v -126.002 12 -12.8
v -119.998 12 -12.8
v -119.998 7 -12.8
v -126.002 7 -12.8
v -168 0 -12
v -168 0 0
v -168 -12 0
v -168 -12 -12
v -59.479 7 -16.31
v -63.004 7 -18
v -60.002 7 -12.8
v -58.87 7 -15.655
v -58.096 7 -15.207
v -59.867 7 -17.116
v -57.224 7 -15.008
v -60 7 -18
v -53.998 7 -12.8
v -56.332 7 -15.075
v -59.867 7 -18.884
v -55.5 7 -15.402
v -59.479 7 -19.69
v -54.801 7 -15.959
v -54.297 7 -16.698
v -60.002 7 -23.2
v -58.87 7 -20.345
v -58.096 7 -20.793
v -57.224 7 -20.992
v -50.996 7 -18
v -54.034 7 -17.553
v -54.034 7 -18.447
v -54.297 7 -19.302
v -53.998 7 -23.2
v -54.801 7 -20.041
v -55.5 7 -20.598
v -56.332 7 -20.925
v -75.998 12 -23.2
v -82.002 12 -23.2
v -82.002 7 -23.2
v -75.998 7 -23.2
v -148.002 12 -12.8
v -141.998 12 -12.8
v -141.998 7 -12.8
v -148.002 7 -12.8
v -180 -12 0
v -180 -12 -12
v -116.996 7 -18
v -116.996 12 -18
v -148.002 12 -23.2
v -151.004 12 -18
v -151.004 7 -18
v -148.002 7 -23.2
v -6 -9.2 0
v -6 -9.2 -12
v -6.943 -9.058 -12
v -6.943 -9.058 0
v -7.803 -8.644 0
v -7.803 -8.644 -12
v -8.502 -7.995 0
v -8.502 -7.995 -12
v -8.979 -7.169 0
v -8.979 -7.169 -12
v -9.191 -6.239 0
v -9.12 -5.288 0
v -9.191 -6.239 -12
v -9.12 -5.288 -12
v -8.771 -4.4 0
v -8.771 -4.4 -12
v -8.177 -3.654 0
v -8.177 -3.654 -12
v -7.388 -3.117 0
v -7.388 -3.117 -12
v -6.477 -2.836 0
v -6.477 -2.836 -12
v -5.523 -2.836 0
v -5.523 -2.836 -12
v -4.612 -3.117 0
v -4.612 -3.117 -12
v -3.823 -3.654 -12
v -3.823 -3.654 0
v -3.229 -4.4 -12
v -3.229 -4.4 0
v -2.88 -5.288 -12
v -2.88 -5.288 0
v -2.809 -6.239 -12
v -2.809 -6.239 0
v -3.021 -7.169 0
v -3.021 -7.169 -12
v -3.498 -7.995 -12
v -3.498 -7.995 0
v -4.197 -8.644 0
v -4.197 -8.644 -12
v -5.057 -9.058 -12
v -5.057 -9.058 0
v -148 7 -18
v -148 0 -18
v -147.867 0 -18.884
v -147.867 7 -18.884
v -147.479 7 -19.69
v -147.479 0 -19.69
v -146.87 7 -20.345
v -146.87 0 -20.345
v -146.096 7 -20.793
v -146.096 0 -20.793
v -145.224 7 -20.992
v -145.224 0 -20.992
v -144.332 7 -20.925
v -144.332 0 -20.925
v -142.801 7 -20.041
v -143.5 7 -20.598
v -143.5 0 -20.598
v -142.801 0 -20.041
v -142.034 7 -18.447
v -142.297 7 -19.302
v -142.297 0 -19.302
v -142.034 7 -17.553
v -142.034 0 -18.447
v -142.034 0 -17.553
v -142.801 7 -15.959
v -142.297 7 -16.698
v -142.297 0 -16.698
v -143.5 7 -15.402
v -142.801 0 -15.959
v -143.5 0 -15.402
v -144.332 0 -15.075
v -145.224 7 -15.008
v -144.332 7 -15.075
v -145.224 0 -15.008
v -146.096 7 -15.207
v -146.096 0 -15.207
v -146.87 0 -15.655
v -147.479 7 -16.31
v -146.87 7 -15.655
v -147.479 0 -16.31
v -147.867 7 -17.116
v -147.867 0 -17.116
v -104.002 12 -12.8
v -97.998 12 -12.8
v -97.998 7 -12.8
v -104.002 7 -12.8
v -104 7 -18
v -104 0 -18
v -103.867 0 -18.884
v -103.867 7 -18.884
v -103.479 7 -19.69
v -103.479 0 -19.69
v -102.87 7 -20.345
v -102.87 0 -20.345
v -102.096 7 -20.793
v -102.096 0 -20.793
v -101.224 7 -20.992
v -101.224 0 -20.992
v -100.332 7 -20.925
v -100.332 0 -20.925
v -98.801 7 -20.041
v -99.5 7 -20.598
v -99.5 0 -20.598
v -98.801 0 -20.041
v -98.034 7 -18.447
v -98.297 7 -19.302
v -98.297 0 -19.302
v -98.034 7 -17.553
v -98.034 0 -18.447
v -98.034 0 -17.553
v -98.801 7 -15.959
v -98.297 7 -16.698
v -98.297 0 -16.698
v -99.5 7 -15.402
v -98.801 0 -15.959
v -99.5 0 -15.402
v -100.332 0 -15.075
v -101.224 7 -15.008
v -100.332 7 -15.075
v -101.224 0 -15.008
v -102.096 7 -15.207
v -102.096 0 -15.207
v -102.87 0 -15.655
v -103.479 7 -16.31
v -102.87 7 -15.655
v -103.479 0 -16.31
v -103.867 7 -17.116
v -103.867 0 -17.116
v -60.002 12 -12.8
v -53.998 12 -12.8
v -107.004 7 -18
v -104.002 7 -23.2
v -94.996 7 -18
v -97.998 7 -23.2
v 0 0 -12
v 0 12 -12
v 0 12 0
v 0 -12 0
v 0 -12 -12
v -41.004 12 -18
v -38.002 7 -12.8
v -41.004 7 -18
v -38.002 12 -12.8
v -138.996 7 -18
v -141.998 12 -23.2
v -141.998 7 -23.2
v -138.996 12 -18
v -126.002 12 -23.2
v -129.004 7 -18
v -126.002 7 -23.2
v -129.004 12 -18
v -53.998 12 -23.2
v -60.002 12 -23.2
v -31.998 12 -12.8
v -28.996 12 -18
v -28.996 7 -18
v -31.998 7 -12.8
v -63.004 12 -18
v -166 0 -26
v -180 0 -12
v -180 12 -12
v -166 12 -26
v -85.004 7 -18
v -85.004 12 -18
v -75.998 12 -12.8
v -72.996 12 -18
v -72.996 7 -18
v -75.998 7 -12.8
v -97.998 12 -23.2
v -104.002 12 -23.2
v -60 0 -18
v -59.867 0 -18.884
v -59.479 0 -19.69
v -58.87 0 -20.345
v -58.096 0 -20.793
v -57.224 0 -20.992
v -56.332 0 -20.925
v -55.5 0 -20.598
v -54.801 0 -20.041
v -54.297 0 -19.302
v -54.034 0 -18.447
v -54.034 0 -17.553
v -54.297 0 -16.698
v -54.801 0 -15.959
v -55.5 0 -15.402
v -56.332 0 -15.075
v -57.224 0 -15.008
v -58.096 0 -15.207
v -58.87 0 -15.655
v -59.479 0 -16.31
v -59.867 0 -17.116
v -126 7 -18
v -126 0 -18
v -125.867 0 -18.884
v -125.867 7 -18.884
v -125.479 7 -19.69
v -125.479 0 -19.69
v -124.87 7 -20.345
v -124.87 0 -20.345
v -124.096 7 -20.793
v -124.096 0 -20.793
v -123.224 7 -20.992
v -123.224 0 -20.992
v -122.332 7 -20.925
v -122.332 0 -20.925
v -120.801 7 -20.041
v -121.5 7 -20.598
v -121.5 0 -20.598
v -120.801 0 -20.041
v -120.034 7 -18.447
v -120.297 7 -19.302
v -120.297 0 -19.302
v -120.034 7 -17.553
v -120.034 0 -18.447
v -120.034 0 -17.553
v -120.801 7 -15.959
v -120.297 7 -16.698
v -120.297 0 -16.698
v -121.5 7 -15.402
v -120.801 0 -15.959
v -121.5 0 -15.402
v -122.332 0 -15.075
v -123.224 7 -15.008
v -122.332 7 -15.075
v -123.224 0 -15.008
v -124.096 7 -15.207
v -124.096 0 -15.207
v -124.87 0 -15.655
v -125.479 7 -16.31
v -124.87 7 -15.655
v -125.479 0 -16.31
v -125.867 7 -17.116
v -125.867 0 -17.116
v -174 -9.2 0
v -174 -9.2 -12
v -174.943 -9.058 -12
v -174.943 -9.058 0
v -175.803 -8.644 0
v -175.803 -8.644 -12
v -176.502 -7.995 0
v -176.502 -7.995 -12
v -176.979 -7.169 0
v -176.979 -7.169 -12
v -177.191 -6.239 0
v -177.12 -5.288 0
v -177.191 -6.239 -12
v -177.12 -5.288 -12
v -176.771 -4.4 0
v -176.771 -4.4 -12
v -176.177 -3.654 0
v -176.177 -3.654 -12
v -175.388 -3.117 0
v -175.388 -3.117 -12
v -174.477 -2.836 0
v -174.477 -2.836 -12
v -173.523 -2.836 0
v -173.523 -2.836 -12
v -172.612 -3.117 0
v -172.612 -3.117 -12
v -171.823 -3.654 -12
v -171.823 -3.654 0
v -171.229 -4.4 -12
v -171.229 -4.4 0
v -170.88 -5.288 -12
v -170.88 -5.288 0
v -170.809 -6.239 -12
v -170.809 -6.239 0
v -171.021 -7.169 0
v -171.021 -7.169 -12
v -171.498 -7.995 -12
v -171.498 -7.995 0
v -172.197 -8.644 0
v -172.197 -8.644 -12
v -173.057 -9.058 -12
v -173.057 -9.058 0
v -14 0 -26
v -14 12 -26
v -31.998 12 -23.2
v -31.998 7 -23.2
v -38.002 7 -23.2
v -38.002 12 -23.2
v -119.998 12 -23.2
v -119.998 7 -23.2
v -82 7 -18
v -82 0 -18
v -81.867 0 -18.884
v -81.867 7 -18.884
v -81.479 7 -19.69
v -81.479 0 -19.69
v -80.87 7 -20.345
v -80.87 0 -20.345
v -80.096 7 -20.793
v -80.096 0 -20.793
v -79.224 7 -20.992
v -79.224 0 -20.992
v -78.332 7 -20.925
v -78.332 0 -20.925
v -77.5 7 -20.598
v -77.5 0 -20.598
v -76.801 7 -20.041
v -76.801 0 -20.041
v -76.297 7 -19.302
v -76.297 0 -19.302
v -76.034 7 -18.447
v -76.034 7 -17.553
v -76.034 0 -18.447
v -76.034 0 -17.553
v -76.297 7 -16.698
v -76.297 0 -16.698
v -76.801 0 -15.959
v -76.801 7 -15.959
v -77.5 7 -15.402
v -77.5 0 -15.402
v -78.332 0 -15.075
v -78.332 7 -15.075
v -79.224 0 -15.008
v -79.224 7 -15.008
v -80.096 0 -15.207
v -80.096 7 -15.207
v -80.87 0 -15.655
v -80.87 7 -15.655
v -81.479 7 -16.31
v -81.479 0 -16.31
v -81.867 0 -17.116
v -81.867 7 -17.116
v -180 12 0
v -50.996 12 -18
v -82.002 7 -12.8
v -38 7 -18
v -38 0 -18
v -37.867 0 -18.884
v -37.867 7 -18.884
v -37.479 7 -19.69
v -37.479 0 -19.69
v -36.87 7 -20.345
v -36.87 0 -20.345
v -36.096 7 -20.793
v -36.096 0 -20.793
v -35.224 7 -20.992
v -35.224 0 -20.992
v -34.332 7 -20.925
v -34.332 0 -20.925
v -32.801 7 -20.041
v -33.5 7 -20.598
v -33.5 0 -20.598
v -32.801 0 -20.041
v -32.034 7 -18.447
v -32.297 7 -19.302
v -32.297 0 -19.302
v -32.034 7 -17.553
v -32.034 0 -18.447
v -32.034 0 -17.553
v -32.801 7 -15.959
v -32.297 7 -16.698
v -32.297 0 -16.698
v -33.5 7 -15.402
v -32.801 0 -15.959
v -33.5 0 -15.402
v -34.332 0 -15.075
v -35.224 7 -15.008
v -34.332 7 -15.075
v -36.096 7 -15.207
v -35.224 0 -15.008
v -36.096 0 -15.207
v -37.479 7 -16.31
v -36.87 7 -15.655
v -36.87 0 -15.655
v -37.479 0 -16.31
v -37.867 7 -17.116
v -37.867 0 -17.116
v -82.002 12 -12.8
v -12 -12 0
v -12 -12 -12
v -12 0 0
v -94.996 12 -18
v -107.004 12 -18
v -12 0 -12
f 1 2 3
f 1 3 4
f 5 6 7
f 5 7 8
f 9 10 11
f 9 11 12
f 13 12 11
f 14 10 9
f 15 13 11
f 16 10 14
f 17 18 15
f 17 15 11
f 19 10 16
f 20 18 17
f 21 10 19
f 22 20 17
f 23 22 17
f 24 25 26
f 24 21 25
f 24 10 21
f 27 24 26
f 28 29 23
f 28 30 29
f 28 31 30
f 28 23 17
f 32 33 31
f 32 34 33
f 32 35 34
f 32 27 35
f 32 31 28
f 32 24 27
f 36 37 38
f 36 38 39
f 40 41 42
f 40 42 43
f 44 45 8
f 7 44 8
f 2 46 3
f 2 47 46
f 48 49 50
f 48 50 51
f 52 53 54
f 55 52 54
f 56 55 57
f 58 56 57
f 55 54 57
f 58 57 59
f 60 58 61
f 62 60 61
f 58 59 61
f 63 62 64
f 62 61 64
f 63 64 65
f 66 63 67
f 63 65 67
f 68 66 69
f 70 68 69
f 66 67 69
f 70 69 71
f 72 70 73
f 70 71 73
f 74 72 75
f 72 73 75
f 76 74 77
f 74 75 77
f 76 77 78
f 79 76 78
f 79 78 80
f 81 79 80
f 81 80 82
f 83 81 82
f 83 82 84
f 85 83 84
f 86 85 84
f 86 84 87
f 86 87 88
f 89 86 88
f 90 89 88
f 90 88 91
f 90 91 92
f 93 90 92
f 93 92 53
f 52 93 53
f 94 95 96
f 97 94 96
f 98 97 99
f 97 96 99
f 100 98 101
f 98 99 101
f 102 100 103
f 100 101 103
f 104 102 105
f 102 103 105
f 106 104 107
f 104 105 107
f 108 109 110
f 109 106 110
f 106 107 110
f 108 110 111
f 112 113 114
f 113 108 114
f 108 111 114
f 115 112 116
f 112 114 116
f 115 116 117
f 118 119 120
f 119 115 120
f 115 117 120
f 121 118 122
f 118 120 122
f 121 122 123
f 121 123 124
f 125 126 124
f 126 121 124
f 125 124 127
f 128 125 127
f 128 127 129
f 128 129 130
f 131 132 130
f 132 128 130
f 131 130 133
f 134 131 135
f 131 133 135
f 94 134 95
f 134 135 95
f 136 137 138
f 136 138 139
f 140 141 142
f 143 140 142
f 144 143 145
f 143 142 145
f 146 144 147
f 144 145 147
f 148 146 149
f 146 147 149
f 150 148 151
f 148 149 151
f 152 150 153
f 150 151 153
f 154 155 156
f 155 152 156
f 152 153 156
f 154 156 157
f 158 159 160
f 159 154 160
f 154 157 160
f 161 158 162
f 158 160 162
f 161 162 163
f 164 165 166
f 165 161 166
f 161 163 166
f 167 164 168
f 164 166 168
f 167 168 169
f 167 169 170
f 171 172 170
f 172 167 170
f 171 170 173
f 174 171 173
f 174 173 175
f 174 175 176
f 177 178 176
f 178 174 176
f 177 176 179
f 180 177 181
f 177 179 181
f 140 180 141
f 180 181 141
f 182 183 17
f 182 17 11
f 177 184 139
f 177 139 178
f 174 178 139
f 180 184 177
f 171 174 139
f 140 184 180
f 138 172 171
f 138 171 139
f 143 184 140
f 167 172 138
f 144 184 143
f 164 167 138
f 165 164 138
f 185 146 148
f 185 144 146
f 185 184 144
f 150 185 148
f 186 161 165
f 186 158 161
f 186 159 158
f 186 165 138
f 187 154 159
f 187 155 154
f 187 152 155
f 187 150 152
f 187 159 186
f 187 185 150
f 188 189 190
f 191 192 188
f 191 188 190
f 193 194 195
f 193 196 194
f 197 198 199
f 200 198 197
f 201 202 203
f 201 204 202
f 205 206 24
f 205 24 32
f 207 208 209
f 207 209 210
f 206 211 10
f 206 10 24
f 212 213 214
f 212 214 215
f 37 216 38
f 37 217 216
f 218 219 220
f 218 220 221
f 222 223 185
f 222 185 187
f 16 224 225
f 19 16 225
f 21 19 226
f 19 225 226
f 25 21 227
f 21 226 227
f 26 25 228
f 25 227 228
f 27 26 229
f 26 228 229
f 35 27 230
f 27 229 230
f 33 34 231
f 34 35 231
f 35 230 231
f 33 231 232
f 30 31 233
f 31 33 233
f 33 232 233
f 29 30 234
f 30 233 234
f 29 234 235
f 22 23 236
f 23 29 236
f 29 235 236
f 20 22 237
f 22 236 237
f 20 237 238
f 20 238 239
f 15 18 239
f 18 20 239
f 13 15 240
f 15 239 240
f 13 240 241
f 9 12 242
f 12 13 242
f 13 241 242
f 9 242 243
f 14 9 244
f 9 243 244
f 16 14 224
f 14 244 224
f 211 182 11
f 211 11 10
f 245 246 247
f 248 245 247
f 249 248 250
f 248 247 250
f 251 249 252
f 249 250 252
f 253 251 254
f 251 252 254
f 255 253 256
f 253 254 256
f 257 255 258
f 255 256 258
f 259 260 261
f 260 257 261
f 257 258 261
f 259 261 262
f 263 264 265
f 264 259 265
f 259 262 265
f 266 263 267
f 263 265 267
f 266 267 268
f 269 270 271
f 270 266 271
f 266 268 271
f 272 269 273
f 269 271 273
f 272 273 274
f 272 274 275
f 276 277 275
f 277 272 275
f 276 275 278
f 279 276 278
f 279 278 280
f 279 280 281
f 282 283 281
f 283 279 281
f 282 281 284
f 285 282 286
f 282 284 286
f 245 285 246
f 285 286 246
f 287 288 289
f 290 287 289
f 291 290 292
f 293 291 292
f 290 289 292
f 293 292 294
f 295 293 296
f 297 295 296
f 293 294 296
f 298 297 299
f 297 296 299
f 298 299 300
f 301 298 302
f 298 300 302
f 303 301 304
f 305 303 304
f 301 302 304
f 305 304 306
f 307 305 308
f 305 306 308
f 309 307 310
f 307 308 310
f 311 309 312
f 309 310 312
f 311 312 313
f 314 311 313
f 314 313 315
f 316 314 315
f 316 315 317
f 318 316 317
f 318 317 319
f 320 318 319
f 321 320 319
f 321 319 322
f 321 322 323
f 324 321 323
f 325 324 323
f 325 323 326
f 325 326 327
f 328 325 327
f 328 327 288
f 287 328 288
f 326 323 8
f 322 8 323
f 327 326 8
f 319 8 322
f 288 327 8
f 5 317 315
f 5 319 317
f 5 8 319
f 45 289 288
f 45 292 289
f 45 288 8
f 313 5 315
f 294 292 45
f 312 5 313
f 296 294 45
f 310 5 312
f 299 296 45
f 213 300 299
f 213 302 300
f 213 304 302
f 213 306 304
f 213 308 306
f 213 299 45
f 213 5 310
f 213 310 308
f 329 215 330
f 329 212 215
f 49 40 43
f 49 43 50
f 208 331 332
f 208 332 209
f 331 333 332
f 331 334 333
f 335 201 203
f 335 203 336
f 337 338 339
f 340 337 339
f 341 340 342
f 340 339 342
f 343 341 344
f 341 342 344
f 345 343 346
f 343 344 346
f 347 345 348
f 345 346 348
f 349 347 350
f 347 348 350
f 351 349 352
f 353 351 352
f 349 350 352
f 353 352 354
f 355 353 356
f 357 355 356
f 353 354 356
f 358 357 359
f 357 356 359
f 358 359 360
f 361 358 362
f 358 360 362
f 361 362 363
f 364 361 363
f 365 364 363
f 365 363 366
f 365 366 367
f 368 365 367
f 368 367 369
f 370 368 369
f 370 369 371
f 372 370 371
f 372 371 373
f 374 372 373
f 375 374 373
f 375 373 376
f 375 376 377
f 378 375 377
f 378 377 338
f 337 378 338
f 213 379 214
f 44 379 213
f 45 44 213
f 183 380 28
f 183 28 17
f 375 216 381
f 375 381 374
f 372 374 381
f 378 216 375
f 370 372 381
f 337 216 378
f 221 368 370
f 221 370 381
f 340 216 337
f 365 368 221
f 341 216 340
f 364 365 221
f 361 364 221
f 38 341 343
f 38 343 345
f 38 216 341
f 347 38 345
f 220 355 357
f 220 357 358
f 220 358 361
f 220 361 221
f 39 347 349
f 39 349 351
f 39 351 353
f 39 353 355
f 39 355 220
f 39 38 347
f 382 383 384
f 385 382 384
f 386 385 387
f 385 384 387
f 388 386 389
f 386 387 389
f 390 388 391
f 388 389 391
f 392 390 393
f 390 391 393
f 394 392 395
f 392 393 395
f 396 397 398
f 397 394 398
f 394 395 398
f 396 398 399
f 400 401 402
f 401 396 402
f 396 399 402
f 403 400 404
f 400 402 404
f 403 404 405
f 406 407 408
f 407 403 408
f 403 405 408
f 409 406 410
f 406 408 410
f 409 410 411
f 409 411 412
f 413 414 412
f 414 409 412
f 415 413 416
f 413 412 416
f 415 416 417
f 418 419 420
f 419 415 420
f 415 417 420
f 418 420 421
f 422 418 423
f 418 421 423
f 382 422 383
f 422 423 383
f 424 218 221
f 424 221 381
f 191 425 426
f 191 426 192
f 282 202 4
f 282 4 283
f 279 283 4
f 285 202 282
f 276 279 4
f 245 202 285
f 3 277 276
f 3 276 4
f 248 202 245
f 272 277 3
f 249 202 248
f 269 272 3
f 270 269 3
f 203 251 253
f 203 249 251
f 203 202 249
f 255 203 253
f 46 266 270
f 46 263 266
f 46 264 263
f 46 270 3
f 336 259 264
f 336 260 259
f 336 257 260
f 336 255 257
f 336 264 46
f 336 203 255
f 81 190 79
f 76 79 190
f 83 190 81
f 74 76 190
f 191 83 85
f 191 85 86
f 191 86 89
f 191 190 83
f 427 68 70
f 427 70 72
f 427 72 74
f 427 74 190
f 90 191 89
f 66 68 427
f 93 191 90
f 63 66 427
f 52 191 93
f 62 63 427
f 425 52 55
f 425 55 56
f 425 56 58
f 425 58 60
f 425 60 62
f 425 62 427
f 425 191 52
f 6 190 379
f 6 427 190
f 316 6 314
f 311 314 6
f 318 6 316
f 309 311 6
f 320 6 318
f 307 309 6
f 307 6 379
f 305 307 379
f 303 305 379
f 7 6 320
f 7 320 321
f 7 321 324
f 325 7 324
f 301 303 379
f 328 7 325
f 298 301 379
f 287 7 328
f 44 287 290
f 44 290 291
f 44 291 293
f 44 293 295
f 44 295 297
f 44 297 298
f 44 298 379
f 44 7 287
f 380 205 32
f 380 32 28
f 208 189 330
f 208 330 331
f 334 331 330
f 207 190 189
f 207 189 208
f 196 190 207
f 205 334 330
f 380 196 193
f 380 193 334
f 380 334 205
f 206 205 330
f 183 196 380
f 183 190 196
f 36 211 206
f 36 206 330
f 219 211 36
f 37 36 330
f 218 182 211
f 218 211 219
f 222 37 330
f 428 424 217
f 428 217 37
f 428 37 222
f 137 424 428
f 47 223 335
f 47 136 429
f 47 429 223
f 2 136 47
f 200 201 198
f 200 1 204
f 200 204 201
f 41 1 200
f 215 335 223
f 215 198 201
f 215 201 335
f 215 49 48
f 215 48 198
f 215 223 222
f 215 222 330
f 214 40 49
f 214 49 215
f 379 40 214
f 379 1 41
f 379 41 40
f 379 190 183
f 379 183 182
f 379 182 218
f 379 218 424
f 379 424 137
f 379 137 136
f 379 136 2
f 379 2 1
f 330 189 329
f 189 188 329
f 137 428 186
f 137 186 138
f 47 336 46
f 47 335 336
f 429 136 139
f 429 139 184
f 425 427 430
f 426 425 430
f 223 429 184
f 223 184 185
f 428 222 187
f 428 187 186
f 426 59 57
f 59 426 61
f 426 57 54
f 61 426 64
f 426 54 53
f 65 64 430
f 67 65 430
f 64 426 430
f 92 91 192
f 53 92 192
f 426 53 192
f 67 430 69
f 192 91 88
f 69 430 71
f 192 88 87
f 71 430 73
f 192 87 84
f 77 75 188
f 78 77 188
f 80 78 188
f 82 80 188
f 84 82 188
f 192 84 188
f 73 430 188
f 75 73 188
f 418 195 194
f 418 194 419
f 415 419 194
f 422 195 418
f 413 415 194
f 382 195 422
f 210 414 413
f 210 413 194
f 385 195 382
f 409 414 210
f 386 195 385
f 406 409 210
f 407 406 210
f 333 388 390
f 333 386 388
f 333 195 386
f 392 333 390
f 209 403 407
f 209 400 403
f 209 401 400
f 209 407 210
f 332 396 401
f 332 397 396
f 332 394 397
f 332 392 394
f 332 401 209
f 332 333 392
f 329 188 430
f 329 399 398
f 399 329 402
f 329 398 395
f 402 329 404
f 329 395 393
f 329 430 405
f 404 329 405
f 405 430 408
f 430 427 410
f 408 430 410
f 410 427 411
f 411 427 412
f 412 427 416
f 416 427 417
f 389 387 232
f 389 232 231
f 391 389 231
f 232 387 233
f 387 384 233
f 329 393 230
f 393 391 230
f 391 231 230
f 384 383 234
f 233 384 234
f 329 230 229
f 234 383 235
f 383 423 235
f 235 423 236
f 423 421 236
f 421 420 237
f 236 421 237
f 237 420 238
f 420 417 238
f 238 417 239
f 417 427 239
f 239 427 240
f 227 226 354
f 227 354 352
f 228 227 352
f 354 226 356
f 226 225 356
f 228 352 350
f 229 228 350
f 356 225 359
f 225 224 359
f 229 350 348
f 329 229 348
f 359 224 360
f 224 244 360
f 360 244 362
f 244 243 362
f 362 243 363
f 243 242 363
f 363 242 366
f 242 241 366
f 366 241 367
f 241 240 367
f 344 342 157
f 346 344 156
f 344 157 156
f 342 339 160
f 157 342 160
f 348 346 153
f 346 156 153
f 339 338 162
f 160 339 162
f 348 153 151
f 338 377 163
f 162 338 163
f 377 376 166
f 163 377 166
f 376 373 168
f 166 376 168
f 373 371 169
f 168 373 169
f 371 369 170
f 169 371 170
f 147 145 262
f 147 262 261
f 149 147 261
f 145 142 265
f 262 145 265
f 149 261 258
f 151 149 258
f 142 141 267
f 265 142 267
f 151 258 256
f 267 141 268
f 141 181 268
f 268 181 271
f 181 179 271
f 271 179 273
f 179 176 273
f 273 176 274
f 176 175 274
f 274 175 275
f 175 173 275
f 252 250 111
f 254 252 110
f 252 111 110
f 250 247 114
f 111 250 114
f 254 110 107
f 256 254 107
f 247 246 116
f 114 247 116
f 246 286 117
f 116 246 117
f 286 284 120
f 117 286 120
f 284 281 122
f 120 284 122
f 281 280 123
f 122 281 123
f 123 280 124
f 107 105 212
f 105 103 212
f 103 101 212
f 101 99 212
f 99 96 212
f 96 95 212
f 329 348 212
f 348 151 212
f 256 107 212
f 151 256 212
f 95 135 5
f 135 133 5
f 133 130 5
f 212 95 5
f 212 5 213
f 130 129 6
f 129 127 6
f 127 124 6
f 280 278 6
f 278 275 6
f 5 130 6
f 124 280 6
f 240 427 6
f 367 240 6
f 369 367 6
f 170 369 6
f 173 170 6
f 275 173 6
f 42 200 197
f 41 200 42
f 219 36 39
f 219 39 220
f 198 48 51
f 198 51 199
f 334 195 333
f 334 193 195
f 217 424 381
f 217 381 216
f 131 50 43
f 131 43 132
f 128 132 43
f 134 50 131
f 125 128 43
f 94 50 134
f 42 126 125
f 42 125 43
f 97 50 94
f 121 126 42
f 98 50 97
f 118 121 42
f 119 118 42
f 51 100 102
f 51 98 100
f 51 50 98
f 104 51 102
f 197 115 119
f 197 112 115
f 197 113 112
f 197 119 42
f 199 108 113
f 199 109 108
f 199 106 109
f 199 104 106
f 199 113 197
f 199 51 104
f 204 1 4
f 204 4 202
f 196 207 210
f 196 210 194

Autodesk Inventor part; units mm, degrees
ref_plane "YZ Plane" through (0, 0, 0) normal (1, 0, 0) x (0, 1, 0)
ref_plane "XZ Plane" through (0, 0, 0) normal (0, 1, 0) x (-1, 0, 0)
ref_plane "XY Plane" through (0, 0, 0) normal (0, 0, 1) x (1, 0, 0)
sketch "Sketch5" plane through (0, 0, 0) normal (0, 1, 0) x (-1, 0, 0)
  line L0 (0, 0) -> (180, 0)
  line L1 (180, 0) -> (180, -12)
  line L2 (0, -12) -> (0, 0)
  line L3 (166, -26) -> (14, -26)
  line L4 (0, -12) -> (14, -26)
  line L5 (180, -12) -> (166, -26)
  circle A0 centre (101, -18) radius 3
  circle A1 centre (79, -18) radius 3
  circle A2 centre (57, -18) radius 3
  circle A3 centre (123, -18) radius 3
  circle A4 centre (145, -18) radius 3
  circle A5 centre (35, -18) radius 3
  dimension "d57" = 6
  dimension "d58" = 79
  dimension "d59" = 180
  dimension "d60" = 12
  dimension "d61" = 14
  dimension "d62" = 14
  dimension "d63" = 14
  dimension "d64" = 14
  dimension "d65" = 152
  dimension "d66" = 8
  dimension "d67" = 6
  dimension "d68" = 6
  dimension "d69" = 6
  dimension "d70" = 6
  dimension "d71" = 8
  dimension "d72" = 8
  dimension "d73" = 8
  dimension "d74" = 8
  dimension "d75" = 22
  dimension "d76" = 22
  dimension "d77" = 22
  dimension "d78" = 22
  dimension "d95" = 6
  dimension "d96" = 0
  dimension "d97" = 22
extrude "Extrusion7" add sketch "Sketch5" along normal blind 12
sketch "Sketch8" plane through (0, 0, 0) normal (0, -1, 0) x (1, 0, 0)
  line L0 (0, 0) -> (0, -12) projected
  line L1 (0, 0) -> (-12, 0)
  line L2 (-12, 0) -> (-12, -12)
  line L3 (-12, -12) -> (0, -12)
  line L4 (0, -12) -> (0, 0)
  line L5 (-180, -12) -> (-180, 0) projected
  line L6 (-180, 0) -> (-168, 0)
  line L7 (-168, 0) -> (-168, -12)
  line L8 (-168, -12) -> (-180, -12)
  line L9 (-180, -12) -> (-180, 0)
  dimension "d100" = 12
  dimension "d101" = 12
  dimension "d102" = 12
  dimension "d103" = 12
extrude "Extrusion8" add sketch "Sketch8" along normal blind 12
sketch "Sketch11" plane through (0, 12, 0) normal (0, 1, 0) x (1, 0, 0)
  circle A0 centre (-35, 18) radius 3 projected
  line L0 (-38.0022, 12.8) -> (-41.0044, 18)
  line L1 (-41.0044, 18) -> (-38.0022, 23.2)
  line L2 (-38.0022, 23.2) -> (-31.9978, 23.2)
  line L3 (-31.9978, 23.2) -> (-28.9956, 18)
  line L4 (-28.9956, 18) -> (-31.9978, 12.8)
  line L5 (-31.9978, 12.8) -> (-38.0022, 12.8)
  circle A1 centre (-57, 18) radius 3 projected
  line L6 (-60.0022, 12.8) -> (-63.0044, 18)
  line L7 (-63.0044, 18) -> (-60.0022, 23.2)
  line L8 (-60.0022, 23.2) -> (-53.9978, 23.2)
  line L9 (-53.9978, 23.2) -> (-50.9956, 18)
  line L10 (-50.9956, 18) -> (-53.9978, 12.8)
  line L11 (-53.9978, 12.8) -> (-60.0022, 12.8)
  line L12 (-75.9978, 12.8) -> (-82.0022, 12.8)
  line L13 (-82.0022, 12.8) -> (-85.0044, 18)
  line L14 (-85.0044, 18) -> (-82.0022, 23.2)
  line L15 (-82.0022, 23.2) -> (-75.9978, 23.2)
  line L16 (-75.9978, 23.2) -> (-72.9956, 18)
  line L17 (-72.9956, 18) -> (-75.9978, 12.8)
  circle A2 centre (-101, 18) radius 3 projected
  line L18 (-104.0022, 12.8) -> (-107.0044, 18)
  line L19 (-107.0044, 18) -> (-104.0022, 23.2)
  line L20 (-104.0022, 23.2) -> (-97.9978, 23.2)
  line L21 (-97.9978, 23.2) -> (-94.9956, 18)
  line L22 (-94.9956, 18) -> (-97.9978, 12.8)
  line L23 (-97.9978, 12.8) -> (-104.0022, 12.8)
  circle A3 centre (-123, 18) radius 3 projected
  line L24 (-119.9978, 12.8) -> (-126.0022, 12.8)
  line L25 (-126.0022, 12.8) -> (-129.0044, 18)
  line L26 (-129.0044, 18) -> (-126.0022, 23.2)
  line L27 (-126.0022, 23.2) -> (-119.9978, 23.2)
  line L28 (-119.9978, 23.2) -> (-116.9956, 18)
  line L29 (-116.9956, 18) -> (-119.9978, 12.8)
  circle A4 centre (-145, 18) radius 3 projected
  line L30 (-148.0022, 12.8) -> (-151.0044, 18)
  line L31 (-151.0044, 18) -> (-148.0022, 23.2)
  line L32 (-148.0022, 23.2) -> (-141.9978, 23.2)
  line L33 (-141.9978, 23.2) -> (-138.9956, 18)
  line L34 (-138.9956, 18) -> (-141.9978, 12.8)
  line L35 (-141.9978, 12.8) -> (-148.0022, 12.8)
  point P0 (0, 0)
  point P1 (-79, 18)
  dimension "d123" = 5.2
  dimension "d125" = 5.2
  dimension "d126" = 5.2
  dimension "d127" = 5.2
  dimension "d128" = 5.2
  dimension "d129" = 22
extrude "Extrusion11" cut sketch "Sketch11" against normal blind 5
hole "Hole3" at (-6, -6, 0) direction (0, 0, -1) diameter 6.4 depth 12 tip angle 118
hole "Hole4" at (-174, -6, 0) direction (0, 0, -1) diameter 6.4 depth 12 tip angle 118
properties part number "frameBottomRight" material "ABS Plastic"
